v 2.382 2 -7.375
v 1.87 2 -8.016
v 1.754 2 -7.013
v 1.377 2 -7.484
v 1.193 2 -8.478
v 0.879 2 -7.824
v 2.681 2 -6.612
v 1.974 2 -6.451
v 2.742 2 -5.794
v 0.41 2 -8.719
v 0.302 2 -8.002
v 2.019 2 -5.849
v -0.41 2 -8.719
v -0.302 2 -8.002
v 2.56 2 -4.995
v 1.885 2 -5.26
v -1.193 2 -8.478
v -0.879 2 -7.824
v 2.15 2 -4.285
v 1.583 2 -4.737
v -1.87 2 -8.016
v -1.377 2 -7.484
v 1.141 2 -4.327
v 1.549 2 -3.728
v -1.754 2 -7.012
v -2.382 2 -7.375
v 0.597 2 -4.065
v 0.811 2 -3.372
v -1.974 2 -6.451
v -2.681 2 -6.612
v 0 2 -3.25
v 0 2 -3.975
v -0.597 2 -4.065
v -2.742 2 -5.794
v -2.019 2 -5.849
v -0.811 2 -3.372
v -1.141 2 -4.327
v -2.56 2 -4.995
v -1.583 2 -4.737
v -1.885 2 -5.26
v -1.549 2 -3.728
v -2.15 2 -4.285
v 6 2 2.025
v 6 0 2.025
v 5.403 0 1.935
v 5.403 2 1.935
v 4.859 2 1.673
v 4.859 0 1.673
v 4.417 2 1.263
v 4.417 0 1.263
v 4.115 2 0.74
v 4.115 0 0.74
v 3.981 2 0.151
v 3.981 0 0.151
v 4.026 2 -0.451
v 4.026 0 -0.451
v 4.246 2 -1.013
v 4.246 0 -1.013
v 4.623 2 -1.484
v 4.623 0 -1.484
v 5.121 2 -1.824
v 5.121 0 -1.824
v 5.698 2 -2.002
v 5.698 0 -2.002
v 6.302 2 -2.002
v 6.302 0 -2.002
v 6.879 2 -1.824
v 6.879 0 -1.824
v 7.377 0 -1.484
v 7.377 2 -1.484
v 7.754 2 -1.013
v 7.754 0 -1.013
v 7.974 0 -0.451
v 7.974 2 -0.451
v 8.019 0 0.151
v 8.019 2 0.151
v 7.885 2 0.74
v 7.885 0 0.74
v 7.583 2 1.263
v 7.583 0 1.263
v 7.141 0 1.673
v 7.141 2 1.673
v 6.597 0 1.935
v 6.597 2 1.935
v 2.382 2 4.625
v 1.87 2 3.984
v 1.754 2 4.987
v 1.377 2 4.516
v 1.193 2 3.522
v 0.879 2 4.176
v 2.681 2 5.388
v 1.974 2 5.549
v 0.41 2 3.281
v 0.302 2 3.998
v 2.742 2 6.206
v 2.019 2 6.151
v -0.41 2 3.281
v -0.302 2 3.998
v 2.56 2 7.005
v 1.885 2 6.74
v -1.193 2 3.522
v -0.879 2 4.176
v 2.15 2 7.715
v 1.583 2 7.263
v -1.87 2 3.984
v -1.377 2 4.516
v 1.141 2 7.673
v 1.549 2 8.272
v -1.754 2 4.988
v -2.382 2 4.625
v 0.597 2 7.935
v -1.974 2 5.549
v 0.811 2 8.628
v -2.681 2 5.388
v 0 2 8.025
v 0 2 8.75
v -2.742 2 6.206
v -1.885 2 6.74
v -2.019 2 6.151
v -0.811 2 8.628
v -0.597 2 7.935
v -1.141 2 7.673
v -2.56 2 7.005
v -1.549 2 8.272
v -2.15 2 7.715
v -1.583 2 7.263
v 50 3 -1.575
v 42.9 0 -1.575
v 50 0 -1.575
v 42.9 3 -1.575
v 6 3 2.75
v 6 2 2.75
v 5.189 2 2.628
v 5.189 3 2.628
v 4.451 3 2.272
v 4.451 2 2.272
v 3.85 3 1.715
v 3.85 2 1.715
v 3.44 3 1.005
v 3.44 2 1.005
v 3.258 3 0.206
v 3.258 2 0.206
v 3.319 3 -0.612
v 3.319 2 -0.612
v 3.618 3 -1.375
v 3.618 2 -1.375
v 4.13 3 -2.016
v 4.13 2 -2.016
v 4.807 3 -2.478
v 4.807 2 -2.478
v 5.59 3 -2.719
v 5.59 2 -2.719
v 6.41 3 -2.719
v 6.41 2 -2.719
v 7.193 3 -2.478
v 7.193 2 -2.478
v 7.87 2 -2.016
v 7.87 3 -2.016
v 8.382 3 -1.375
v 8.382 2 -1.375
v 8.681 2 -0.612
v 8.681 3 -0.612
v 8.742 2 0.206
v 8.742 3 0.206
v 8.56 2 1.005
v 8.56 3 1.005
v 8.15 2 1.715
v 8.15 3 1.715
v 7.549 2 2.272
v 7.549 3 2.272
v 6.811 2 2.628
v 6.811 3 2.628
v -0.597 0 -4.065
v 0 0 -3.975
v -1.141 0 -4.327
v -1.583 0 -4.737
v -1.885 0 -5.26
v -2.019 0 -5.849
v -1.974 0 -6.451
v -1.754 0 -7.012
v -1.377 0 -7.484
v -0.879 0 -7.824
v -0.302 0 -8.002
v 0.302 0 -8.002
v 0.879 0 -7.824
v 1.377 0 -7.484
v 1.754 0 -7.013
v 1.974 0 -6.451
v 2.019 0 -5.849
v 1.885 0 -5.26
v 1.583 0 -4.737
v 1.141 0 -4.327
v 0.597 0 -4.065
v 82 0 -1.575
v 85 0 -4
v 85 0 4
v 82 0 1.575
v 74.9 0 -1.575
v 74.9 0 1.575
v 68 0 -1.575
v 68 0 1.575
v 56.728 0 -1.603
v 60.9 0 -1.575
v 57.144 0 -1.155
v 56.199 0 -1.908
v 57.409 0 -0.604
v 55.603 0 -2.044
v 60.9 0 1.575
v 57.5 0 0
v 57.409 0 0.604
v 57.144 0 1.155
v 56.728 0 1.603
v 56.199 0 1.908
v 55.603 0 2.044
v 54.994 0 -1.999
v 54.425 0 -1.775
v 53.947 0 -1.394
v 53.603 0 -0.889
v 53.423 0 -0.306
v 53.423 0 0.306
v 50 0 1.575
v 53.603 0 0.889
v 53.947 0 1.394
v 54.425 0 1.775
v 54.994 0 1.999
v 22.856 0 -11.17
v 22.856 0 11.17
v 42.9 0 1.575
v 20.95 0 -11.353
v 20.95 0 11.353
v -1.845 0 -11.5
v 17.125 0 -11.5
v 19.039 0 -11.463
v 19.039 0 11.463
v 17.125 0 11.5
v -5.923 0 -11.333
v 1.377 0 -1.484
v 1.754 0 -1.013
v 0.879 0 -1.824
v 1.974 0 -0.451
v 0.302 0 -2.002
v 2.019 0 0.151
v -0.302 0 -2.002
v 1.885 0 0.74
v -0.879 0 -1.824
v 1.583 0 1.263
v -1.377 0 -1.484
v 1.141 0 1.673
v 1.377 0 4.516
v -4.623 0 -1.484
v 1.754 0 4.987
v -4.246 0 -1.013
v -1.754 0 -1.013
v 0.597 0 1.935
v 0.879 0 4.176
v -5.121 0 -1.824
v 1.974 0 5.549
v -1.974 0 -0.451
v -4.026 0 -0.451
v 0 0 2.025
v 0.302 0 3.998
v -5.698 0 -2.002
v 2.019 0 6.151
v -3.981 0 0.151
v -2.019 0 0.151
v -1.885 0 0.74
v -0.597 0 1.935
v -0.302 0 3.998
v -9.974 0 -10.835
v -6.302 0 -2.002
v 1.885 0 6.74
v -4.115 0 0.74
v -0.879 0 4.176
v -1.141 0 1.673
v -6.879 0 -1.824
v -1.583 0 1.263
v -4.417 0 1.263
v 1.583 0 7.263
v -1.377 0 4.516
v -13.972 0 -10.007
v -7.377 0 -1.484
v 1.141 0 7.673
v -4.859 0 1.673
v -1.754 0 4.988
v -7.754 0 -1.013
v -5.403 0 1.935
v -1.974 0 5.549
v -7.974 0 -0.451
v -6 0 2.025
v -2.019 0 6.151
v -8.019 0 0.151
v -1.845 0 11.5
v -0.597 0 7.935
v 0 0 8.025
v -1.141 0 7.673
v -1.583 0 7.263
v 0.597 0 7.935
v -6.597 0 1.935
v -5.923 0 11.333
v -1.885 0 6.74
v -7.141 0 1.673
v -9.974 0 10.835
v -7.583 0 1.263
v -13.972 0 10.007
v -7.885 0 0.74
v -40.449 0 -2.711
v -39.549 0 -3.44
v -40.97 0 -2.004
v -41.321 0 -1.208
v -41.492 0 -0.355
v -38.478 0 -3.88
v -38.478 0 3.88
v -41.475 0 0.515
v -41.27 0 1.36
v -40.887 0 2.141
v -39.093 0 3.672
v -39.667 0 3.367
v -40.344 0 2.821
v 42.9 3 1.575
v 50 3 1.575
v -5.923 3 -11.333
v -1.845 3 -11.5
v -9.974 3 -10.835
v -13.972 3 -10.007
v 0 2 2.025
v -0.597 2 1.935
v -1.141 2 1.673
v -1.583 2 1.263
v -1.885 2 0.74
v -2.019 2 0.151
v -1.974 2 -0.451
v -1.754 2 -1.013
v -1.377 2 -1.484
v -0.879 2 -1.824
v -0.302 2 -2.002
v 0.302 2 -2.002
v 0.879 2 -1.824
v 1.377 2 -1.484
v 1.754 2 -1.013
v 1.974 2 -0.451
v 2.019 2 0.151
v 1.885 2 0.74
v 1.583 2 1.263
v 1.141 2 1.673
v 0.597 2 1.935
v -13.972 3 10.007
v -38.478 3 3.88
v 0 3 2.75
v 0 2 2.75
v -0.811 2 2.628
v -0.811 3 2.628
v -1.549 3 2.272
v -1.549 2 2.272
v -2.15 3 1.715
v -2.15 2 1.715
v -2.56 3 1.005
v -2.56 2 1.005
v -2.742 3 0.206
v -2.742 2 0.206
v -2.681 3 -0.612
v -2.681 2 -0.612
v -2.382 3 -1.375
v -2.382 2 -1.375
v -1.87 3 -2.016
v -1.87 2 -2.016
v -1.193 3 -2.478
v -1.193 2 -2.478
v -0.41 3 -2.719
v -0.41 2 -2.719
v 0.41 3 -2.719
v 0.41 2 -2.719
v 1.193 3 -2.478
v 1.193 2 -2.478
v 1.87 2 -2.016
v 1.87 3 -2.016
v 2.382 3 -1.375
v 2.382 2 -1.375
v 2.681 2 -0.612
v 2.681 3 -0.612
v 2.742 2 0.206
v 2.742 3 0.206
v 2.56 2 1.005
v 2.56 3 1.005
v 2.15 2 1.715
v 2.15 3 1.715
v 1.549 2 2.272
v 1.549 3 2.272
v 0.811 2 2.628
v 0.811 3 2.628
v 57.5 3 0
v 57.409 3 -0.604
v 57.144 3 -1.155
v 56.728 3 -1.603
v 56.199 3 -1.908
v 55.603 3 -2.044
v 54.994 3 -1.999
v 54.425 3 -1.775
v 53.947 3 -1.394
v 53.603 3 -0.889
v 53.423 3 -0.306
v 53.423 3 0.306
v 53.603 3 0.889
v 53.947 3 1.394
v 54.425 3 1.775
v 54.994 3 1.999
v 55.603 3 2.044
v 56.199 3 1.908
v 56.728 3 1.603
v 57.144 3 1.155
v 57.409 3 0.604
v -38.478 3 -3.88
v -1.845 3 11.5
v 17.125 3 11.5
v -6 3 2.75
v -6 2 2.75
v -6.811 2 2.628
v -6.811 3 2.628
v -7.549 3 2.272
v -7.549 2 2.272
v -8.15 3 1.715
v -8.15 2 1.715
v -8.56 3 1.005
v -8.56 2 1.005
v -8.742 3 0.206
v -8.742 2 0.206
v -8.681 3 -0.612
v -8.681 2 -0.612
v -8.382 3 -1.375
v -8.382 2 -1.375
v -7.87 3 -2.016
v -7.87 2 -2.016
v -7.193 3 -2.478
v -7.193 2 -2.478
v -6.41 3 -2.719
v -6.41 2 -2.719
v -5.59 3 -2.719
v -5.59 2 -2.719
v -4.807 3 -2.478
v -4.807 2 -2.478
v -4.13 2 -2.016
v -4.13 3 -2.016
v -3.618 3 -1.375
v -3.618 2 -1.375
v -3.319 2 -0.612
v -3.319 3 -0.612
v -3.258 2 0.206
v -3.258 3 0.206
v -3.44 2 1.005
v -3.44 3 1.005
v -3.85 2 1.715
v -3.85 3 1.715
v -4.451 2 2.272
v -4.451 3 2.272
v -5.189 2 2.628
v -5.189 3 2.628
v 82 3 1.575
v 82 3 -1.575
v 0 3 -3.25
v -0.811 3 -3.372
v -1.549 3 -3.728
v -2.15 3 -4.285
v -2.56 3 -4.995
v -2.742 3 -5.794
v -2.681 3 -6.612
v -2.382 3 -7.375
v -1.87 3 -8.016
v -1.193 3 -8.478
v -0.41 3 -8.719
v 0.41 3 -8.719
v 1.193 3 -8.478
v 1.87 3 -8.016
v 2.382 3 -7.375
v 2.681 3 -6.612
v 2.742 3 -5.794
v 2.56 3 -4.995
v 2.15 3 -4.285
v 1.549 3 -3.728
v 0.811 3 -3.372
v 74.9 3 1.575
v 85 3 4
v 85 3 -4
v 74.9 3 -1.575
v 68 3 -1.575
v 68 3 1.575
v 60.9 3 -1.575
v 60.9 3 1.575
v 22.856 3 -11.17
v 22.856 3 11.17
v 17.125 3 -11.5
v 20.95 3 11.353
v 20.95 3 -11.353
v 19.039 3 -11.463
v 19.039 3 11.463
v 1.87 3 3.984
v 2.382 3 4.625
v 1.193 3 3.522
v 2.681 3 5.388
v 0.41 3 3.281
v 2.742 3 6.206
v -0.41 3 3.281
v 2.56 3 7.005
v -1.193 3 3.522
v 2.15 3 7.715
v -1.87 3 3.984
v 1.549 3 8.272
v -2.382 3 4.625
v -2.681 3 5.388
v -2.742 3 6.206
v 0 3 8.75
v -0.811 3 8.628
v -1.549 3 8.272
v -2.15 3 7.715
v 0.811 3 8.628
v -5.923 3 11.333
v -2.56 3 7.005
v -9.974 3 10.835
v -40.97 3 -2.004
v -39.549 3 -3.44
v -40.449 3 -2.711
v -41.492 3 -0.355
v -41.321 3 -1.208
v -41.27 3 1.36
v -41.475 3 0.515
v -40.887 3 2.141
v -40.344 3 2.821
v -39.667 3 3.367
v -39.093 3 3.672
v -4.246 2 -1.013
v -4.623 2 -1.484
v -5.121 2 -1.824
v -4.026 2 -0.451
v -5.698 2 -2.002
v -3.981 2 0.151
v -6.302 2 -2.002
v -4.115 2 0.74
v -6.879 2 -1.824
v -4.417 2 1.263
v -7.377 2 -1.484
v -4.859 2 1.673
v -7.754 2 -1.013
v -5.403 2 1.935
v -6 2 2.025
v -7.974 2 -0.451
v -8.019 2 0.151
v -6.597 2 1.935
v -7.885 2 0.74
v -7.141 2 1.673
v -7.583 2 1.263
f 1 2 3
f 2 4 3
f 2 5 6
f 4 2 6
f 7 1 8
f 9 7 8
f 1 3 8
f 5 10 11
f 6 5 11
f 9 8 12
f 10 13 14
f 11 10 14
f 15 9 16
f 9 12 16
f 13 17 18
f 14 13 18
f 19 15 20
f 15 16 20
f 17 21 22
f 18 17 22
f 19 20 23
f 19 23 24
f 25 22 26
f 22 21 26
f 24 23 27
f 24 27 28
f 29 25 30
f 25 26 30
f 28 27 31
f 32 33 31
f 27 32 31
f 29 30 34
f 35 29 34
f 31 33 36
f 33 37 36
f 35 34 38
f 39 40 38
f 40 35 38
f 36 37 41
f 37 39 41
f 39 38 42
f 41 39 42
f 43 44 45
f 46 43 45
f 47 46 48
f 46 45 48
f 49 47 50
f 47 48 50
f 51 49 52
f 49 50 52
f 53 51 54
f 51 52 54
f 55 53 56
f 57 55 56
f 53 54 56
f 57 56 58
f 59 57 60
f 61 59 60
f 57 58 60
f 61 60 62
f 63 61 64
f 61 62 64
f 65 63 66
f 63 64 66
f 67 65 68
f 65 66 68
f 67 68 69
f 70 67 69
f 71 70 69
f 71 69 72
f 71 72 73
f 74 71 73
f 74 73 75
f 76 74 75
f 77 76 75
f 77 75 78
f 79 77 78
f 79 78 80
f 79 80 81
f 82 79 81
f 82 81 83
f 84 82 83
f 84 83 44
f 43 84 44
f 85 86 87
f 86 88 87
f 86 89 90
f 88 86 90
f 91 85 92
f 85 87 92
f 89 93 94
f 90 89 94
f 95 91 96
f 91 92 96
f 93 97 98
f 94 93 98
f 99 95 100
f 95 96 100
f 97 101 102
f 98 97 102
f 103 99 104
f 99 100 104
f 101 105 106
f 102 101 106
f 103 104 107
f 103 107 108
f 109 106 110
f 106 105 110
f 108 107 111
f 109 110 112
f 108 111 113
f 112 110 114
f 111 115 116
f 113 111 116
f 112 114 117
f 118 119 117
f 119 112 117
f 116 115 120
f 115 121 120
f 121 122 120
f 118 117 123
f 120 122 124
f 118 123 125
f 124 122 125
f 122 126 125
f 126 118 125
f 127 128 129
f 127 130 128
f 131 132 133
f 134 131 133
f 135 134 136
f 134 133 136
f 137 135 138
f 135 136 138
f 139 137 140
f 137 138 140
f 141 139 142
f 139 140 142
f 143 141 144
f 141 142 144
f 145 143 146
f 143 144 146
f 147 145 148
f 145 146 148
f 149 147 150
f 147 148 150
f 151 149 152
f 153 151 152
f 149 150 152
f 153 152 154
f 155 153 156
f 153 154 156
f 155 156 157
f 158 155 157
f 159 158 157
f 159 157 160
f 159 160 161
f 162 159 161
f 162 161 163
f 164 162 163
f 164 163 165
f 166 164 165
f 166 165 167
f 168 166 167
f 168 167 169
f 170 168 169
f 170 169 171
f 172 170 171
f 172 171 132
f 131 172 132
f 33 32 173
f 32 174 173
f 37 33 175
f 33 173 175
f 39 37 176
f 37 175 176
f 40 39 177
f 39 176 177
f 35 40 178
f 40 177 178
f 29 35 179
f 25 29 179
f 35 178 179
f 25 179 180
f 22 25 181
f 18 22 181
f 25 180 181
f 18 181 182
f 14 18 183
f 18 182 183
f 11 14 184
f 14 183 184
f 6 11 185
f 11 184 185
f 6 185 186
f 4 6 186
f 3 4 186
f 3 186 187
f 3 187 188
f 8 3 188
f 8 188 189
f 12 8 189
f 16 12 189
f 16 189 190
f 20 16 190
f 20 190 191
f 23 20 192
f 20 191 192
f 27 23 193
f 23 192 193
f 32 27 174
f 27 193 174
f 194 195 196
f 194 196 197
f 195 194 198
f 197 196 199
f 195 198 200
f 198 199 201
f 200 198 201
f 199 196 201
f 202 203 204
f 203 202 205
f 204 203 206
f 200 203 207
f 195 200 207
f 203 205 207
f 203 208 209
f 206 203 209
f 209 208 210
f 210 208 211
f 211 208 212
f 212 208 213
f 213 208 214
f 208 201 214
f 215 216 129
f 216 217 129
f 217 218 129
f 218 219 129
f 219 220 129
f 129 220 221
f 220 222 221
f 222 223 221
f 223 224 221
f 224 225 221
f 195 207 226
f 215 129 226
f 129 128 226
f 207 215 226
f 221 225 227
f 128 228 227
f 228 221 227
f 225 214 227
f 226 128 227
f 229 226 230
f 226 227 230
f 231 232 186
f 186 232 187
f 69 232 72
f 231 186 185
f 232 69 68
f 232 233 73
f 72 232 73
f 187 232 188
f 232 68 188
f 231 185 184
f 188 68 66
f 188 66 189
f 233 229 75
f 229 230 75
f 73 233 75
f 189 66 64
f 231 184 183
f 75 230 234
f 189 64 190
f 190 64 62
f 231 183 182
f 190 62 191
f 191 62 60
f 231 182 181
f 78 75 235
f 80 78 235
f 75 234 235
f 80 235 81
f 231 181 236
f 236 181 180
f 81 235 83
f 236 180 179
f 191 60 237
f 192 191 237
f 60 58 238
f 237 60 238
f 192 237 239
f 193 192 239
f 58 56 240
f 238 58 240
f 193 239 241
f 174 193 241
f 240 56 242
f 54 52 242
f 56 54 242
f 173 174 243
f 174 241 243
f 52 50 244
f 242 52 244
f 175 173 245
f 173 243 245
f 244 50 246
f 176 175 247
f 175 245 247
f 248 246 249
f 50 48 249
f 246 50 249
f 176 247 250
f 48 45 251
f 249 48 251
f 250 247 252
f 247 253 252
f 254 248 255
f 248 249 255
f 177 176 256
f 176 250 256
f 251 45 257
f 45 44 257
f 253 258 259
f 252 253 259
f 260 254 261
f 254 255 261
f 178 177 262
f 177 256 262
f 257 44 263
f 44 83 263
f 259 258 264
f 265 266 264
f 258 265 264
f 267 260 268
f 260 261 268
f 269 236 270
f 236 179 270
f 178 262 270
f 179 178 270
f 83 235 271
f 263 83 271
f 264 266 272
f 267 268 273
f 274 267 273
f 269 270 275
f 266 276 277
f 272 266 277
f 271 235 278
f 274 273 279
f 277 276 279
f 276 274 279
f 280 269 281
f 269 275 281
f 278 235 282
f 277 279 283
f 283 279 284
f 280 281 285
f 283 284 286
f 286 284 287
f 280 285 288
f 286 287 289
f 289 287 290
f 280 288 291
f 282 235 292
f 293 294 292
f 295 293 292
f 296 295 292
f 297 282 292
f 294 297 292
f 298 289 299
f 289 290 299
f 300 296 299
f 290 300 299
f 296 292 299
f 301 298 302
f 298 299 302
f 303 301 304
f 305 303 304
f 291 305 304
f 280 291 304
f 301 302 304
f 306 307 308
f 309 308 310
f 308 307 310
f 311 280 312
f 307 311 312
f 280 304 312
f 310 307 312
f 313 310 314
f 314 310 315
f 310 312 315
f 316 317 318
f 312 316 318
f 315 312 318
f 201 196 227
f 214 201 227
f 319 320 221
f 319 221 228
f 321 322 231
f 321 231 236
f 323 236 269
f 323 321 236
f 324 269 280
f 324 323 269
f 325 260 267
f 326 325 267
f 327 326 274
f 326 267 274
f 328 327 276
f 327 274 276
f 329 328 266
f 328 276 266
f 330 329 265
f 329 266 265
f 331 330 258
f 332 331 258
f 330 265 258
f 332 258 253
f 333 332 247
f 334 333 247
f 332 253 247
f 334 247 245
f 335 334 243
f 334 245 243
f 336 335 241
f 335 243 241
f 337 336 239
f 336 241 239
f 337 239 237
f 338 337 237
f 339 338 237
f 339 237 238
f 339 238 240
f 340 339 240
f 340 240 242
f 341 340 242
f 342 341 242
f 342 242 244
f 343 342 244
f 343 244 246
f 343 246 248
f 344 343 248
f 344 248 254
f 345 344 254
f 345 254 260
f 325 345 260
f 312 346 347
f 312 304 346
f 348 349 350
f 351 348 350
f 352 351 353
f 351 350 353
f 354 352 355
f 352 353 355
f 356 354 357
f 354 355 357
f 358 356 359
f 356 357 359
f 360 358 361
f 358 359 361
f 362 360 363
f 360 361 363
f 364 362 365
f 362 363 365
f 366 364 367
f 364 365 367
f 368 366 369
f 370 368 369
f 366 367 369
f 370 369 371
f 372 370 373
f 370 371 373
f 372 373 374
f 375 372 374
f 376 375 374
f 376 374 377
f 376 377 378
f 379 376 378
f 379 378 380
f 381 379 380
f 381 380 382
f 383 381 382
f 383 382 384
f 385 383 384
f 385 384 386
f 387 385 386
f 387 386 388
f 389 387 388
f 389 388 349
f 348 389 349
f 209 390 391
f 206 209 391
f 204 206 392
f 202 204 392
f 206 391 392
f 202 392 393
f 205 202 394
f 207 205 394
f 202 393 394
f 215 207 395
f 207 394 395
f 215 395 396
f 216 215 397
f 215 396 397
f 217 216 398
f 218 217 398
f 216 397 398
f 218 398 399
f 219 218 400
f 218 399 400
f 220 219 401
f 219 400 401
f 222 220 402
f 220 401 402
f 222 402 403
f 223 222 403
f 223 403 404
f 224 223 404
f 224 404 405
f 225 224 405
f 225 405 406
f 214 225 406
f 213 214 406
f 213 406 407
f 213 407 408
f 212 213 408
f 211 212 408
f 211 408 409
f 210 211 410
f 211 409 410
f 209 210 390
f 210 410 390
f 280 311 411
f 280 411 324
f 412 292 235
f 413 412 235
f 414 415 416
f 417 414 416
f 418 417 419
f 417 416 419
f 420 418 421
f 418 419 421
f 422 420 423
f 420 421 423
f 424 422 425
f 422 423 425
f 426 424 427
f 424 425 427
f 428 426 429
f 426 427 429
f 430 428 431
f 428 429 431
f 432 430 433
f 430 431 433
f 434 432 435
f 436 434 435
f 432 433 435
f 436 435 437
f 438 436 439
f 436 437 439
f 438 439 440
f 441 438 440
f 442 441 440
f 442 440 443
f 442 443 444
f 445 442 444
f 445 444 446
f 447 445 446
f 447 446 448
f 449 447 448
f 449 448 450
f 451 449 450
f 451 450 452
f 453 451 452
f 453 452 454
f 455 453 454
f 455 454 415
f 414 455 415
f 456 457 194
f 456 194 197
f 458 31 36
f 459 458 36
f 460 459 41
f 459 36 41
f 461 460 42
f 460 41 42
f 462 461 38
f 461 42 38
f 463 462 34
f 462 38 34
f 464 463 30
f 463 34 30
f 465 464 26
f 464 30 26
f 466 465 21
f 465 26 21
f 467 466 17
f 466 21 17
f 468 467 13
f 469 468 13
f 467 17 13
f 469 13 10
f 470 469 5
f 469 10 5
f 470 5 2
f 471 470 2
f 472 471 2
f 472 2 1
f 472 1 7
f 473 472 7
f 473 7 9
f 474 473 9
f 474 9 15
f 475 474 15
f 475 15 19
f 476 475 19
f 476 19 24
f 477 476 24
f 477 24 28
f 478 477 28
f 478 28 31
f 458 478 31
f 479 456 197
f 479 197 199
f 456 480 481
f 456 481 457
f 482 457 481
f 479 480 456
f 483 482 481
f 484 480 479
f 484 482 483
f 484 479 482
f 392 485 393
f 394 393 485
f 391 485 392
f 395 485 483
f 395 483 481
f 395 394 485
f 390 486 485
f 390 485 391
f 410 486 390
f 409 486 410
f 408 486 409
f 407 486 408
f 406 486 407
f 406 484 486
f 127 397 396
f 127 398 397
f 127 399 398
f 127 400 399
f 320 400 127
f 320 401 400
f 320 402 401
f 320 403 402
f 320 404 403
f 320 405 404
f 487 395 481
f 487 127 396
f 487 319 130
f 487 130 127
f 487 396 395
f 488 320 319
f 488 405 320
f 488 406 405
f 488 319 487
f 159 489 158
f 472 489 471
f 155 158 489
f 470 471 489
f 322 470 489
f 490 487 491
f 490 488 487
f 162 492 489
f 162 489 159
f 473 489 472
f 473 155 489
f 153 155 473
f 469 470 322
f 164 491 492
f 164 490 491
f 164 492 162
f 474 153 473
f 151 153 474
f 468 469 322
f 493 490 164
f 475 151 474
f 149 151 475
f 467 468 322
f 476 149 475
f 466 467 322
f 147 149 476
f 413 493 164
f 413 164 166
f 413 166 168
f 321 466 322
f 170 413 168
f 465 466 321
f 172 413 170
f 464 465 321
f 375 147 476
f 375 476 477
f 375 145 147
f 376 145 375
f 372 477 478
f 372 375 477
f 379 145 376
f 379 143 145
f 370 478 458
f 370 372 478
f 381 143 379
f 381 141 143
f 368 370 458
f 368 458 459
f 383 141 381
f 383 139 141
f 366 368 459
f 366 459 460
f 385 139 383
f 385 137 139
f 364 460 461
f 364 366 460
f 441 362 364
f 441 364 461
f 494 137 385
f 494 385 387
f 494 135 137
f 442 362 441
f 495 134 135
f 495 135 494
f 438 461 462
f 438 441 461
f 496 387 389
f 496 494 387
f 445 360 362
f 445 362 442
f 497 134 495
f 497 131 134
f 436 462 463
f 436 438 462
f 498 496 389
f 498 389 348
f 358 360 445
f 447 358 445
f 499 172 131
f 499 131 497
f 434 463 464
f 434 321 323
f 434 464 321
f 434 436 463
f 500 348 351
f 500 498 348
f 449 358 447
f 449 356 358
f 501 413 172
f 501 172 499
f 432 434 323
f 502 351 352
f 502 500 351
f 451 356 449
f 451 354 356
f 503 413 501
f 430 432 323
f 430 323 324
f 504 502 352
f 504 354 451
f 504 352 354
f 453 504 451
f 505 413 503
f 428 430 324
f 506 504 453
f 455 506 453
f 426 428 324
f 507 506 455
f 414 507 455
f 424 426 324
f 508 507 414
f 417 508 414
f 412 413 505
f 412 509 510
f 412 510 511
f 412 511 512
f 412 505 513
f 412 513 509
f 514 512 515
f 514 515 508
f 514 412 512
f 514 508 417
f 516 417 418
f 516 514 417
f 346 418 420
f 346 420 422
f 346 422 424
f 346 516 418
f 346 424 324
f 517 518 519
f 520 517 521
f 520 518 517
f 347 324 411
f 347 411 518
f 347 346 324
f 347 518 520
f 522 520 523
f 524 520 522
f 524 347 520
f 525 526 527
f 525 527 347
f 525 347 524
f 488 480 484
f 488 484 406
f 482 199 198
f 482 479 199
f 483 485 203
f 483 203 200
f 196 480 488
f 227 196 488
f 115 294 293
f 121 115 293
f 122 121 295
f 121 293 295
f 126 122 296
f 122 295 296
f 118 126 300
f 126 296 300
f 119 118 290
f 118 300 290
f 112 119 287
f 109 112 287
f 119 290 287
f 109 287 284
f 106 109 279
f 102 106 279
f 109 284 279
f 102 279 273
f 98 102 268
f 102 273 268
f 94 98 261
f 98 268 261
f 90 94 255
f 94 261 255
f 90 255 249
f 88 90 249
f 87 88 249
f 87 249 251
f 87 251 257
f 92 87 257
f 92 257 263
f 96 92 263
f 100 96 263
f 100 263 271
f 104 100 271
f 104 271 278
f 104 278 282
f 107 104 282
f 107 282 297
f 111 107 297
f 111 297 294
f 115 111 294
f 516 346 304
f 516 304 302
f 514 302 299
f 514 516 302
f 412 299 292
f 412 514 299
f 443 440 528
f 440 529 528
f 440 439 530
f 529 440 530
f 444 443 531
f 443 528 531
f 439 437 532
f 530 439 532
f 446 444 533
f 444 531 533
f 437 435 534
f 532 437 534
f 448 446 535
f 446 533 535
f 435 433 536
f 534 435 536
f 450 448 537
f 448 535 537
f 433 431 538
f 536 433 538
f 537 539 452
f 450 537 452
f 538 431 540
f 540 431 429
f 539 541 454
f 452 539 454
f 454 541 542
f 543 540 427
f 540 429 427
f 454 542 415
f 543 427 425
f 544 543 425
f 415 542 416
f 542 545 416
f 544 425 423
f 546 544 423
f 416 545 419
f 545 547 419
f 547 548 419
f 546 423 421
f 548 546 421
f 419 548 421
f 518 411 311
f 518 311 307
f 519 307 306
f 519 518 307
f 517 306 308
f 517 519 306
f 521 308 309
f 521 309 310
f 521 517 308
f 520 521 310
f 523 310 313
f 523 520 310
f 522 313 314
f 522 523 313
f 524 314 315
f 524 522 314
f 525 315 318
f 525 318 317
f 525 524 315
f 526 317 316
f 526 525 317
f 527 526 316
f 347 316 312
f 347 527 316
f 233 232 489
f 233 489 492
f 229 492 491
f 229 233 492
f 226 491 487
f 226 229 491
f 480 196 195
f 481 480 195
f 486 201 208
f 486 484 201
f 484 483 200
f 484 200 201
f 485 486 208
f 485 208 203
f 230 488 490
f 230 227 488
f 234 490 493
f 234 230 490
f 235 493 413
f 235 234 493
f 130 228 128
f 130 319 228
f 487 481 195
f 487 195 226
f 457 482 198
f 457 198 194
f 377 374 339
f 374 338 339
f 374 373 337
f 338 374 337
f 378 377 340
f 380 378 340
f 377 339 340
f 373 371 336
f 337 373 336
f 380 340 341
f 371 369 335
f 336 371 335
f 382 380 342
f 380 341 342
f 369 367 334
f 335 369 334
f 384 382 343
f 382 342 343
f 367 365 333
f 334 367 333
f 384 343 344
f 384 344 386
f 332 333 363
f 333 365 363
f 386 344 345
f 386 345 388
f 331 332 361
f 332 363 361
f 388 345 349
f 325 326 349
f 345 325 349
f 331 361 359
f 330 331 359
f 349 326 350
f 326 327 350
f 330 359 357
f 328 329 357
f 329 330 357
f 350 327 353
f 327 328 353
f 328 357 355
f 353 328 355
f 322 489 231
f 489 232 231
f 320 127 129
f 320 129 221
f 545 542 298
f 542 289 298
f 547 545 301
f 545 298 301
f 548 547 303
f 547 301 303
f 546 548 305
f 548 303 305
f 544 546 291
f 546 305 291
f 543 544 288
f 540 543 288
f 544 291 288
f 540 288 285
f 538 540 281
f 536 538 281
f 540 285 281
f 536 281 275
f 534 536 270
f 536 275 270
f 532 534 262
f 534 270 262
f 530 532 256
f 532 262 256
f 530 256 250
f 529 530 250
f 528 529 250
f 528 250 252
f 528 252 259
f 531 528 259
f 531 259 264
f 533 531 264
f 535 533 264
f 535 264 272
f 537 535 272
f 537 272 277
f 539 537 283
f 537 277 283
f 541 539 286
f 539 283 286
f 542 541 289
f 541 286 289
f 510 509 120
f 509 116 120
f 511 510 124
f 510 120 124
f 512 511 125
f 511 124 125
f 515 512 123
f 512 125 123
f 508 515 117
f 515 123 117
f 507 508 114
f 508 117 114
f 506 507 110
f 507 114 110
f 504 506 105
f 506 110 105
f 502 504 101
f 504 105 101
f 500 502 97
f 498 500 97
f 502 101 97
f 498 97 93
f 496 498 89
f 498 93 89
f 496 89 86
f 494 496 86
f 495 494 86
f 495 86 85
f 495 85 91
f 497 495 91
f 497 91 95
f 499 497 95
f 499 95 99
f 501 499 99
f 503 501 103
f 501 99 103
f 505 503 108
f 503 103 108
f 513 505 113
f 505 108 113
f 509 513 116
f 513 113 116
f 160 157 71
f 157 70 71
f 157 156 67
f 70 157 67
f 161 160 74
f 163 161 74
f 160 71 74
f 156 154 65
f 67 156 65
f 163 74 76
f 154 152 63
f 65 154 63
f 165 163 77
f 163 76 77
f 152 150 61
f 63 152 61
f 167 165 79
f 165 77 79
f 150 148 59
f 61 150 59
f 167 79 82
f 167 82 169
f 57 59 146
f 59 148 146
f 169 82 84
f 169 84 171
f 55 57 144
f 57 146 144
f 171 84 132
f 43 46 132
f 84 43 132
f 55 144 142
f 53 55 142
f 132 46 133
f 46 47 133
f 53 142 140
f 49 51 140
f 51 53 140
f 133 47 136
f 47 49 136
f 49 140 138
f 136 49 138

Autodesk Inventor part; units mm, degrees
ref_plane "YZ Plane" through (0, 0, 0) normal (1, 0, 0) x (0, 1, 0)
ref_plane "XZ Plane" through (0, 0, 0) normal (0, 1, 0) x (-1, 0, 0)
ref_plane "XY Plane" through (0, 0, 0) normal (0, 0, 1) x (1, 0, 0)
sketch "Esquisse1" plane through (0, 0, 0) normal (0, 1, 0) x (-1, 0, 0)
  line L0 (8, 11.5) -> (-85, 11.5)
  line L1 (-85, 11.5) -> (-85, -11.5)
  line L2 (-85, -11.5) -> (8, -11.5)
  line L3 (8, -11.5) -> (8, 11.5)
  line L4 (0, 11.5) -> (0, -11.5) construction
  line L5 (8, 11.5) -> (42, 3)
  line L6 (42, 3) -> (42, -3)
  line L7 (42, -3) -> (8, -11.5)
  point P0 (0, 0)
  point P1 (0, 0)
  dimension "d0" = 23
  dimension "d1" = 8
  dimension "d3" = 85
  dimension "d4" = 42
  dimension "d5" = 6
extrude "Plaque1" add sketch "Esquisse1" along normal blind 3
sketch "Esquisse2" plane through (0, 3, 0) normal (0, 1, 0) x (1, 0, 0)
  line L0 (0, 0) -> (-6, 0) construction
  point P0 (0, -6)
  point P1 (6, 0)
  point P2 (0, 6)
  dimension "d9" = 360
  dimension "d11" = 6
hole "Perçage1" at (0, 3, 0) at (-6, 3, 0) at (0, 3, 6) at (6, 3, 0) at (0, 3, -6) direction (0, -1, 0) diameter 4.05 end through all counterbore diameter 5.5 counterbore depth 1
sketch "Esquisse3" plane through (0, 3, 0) normal (0, 1, 0) x (1, 0, 0)
  circle A0 centre (6, 0) radius 2.75 construction
  circle A1 centre (-6, 0) radius 2.75 construction
  circle A2 centre (0, 0) radius 2.75 construction
  circle A3 centre (0, -6) radius 2.75 construction
  circle A4 centre (0, 6) radius 2.75 construction
  line L0 (-8, -11.5) -> (-42, -3) construction
  line L1 (85, -11.5) -> (-8, -11.5) construction
  line L2 (85, 11.5) -> (85, -11.5) construction
  line L3 (-8, 11.5) -> (85, 11.5) construction
  line L4 (-42, 3) -> (-8, 11.5) construction
  line L5 (-42, -3) -> (-42, 3) construction
  line L6 (85, -11.5) -> (85, 11.5) projected
  line L7 (85, -4) -> (20, -11.5)
  line L8 (85, -11.5) -> (85, -4)
  line L9 (85, -11.5) -> (20, -11.5)
  line L10 (-8, -11.5) -> (85, -11.5) projected
  line L11 (85, 0) -> (18.7328, 0) construction
  line L12 (85, 4) -> (20, 11.5)
  line L13 (85, 11.5) -> (85, 4)
  line L14 (85, 11.5) -> (20, 11.5)
  dimension "d19" = 8
  dimension "d20" = 65
extrude "Couper1" cut sketch "Esquisse3" against normal through all
fillet "Congé1" radius 50 4 edges at (20, 1.5, 11.5) (-8, 1.5, 11.5) (20, 1.5, -11.5) (-8, 1.5, -11.5)
fillet "Congé2" radius 4 2 edges at (-42, 1.5, -3) (-42, 1.5, 3)
sketch "Esquisse4" plane through (0, 3, 0) normal (0, 1, 0) x (1, 0, 0)
  arc A0 (-38.4777, 3.8806) -> (-38.4777, -3.8806) centre (-37.5076, 0) ccw construction
  arc A1 (-13.9715, -10.0071) -> (-1.8447, -11.5) centre (-1.8447, 38.5) ccw construction
  line L0 (17.1249, -11.5) -> (-1.8447, -11.5) construction
  arc A2 (17.1249, -11.5) -> (22.8561, -11.1704) centre (17.1249, 38.5) ccw construction
  line L1 (22.8561, -11.1704) -> (85, -4) construction
  line L2 (85, 4) -> (85, -4) construction
  line L3 (85, 4) -> (22.8561, 11.1704) construction
  arc A3 (22.8561, 11.1704) -> (17.1249, 11.5) centre (17.1249, -38.5) ccw construction
  line L4 (-1.8447, 11.5) -> (17.1249, 11.5) construction
  arc A4 (-1.8447, 11.5) -> (-13.9715, 10.0071) centre (-1.8447, -38.5) ccw construction
  circle A5 centre (0, 6) radius 2.75 construction
  circle A6 centre (0, -6) radius 2.75 construction
  circle A7 centre (0, 0) radius 2.75 construction
  circle A8 centre (-6, 0) radius 2.75 construction
  circle A9 centre (6, 0) radius 2.75 construction
  line L5 (85, -4) -> (85, 4) construction
  line L6 (85, 4) -> (85, -4) construction
  line L7 (85, 0) -> (71.2936, 0) construction
  line L8 (74.9, 1.575) -> (82, 1.575)
  line L9 (82, 1.575) -> (82, -1.575)
  line L10 (82, -1.575) -> (74.9, -1.575)
  line L11 (74.9, -1.575) -> (74.9, 1.575)
  line L12 (74.9, 0) -> (82, 0) construction
  line L13 (71, 0) -> (57.2936, 0) construction
  line L14 (60.9, 1.575) -> (68, 1.575)
  line L15 (68, 1.575) -> (68, -1.575)
  line L16 (68, -1.575) -> (60.9, -1.575)
  line L17 (60.9, -1.575) -> (60.9, 1.575)
  line L18 (60.9, 0) -> (68, 0) construction
  line L19 (67, 0) -> (53.2936, 0) construction
  line L20 (42.9, -1.575) -> (42.9, 1.575)
  line L21 (50, 1.575) -> (50, -1.575)
  line L22 (50, -1.575) -> (42.9, -1.575)
  line L23 (42.9, 0) -> (50, 0) construction
  line L24 (53, 0) -> (39.2936, 0) construction
  line L25 (42.9, 1.575) -> (50, 1.575)
  line L26 (50, 0) -> (60.9, 0) construction
  circle A10 centre (55.45, 0) radius 2.05
  line L27 (-13.9715, -10.0071) -> (-38.4777, -3.8806) projected
  line L28 (-38.4777, 3.8806) -> (-13.9715, 10.0071) projected
  point P0 (61.8782, 0)
  dimension "d46" = 3.15
  dimension "d47" = 3
  dimension "d48" = 7.1
  dimension "d51" = 14
  dimension "d58" = 18
  dimension "d63" = 4.1
extrude "Couper2" cut sketch "Esquisse4" against normal blind 3
equation "\"d12\" = ollo_hole"
equation "\"d14\" = ollo_ring"
equation "\"d15\" = ollo_depth"
equation "\"d17\" = Epaisseur"
equation "\"d21\" = Epaisseur"
equation "\"d44\" = Epaisseur"
equation "\"LargeurGrugeage\" = Epaisseur"
equation "\"ProfondeurGrugeage\" = 0.5 * Epaisseur"
equation "\"TailleGrugeage\" = 4 * Epaisseur"
equation "\"RestesMinimum\" = 2 * Epaisseur"
equation "\"Rayondetransition\" = RayonPli"
equation "\"TailleRayonJacobi\" = RayonPli"
equation "\"TailleJeu\" = Epaisseur"
equation "\"d6\" = RayonPli"
equation "\"ollo_hole\" = 4.05"
equation "\"ollo_ring\" = 5.5"
equation "\"ollo_depth\" = 1"
equation "\"Epaisseur\" = 3"
equation "\"RayonPli\" = 4"
properties part number "leg" material "Plastique PMMA"
